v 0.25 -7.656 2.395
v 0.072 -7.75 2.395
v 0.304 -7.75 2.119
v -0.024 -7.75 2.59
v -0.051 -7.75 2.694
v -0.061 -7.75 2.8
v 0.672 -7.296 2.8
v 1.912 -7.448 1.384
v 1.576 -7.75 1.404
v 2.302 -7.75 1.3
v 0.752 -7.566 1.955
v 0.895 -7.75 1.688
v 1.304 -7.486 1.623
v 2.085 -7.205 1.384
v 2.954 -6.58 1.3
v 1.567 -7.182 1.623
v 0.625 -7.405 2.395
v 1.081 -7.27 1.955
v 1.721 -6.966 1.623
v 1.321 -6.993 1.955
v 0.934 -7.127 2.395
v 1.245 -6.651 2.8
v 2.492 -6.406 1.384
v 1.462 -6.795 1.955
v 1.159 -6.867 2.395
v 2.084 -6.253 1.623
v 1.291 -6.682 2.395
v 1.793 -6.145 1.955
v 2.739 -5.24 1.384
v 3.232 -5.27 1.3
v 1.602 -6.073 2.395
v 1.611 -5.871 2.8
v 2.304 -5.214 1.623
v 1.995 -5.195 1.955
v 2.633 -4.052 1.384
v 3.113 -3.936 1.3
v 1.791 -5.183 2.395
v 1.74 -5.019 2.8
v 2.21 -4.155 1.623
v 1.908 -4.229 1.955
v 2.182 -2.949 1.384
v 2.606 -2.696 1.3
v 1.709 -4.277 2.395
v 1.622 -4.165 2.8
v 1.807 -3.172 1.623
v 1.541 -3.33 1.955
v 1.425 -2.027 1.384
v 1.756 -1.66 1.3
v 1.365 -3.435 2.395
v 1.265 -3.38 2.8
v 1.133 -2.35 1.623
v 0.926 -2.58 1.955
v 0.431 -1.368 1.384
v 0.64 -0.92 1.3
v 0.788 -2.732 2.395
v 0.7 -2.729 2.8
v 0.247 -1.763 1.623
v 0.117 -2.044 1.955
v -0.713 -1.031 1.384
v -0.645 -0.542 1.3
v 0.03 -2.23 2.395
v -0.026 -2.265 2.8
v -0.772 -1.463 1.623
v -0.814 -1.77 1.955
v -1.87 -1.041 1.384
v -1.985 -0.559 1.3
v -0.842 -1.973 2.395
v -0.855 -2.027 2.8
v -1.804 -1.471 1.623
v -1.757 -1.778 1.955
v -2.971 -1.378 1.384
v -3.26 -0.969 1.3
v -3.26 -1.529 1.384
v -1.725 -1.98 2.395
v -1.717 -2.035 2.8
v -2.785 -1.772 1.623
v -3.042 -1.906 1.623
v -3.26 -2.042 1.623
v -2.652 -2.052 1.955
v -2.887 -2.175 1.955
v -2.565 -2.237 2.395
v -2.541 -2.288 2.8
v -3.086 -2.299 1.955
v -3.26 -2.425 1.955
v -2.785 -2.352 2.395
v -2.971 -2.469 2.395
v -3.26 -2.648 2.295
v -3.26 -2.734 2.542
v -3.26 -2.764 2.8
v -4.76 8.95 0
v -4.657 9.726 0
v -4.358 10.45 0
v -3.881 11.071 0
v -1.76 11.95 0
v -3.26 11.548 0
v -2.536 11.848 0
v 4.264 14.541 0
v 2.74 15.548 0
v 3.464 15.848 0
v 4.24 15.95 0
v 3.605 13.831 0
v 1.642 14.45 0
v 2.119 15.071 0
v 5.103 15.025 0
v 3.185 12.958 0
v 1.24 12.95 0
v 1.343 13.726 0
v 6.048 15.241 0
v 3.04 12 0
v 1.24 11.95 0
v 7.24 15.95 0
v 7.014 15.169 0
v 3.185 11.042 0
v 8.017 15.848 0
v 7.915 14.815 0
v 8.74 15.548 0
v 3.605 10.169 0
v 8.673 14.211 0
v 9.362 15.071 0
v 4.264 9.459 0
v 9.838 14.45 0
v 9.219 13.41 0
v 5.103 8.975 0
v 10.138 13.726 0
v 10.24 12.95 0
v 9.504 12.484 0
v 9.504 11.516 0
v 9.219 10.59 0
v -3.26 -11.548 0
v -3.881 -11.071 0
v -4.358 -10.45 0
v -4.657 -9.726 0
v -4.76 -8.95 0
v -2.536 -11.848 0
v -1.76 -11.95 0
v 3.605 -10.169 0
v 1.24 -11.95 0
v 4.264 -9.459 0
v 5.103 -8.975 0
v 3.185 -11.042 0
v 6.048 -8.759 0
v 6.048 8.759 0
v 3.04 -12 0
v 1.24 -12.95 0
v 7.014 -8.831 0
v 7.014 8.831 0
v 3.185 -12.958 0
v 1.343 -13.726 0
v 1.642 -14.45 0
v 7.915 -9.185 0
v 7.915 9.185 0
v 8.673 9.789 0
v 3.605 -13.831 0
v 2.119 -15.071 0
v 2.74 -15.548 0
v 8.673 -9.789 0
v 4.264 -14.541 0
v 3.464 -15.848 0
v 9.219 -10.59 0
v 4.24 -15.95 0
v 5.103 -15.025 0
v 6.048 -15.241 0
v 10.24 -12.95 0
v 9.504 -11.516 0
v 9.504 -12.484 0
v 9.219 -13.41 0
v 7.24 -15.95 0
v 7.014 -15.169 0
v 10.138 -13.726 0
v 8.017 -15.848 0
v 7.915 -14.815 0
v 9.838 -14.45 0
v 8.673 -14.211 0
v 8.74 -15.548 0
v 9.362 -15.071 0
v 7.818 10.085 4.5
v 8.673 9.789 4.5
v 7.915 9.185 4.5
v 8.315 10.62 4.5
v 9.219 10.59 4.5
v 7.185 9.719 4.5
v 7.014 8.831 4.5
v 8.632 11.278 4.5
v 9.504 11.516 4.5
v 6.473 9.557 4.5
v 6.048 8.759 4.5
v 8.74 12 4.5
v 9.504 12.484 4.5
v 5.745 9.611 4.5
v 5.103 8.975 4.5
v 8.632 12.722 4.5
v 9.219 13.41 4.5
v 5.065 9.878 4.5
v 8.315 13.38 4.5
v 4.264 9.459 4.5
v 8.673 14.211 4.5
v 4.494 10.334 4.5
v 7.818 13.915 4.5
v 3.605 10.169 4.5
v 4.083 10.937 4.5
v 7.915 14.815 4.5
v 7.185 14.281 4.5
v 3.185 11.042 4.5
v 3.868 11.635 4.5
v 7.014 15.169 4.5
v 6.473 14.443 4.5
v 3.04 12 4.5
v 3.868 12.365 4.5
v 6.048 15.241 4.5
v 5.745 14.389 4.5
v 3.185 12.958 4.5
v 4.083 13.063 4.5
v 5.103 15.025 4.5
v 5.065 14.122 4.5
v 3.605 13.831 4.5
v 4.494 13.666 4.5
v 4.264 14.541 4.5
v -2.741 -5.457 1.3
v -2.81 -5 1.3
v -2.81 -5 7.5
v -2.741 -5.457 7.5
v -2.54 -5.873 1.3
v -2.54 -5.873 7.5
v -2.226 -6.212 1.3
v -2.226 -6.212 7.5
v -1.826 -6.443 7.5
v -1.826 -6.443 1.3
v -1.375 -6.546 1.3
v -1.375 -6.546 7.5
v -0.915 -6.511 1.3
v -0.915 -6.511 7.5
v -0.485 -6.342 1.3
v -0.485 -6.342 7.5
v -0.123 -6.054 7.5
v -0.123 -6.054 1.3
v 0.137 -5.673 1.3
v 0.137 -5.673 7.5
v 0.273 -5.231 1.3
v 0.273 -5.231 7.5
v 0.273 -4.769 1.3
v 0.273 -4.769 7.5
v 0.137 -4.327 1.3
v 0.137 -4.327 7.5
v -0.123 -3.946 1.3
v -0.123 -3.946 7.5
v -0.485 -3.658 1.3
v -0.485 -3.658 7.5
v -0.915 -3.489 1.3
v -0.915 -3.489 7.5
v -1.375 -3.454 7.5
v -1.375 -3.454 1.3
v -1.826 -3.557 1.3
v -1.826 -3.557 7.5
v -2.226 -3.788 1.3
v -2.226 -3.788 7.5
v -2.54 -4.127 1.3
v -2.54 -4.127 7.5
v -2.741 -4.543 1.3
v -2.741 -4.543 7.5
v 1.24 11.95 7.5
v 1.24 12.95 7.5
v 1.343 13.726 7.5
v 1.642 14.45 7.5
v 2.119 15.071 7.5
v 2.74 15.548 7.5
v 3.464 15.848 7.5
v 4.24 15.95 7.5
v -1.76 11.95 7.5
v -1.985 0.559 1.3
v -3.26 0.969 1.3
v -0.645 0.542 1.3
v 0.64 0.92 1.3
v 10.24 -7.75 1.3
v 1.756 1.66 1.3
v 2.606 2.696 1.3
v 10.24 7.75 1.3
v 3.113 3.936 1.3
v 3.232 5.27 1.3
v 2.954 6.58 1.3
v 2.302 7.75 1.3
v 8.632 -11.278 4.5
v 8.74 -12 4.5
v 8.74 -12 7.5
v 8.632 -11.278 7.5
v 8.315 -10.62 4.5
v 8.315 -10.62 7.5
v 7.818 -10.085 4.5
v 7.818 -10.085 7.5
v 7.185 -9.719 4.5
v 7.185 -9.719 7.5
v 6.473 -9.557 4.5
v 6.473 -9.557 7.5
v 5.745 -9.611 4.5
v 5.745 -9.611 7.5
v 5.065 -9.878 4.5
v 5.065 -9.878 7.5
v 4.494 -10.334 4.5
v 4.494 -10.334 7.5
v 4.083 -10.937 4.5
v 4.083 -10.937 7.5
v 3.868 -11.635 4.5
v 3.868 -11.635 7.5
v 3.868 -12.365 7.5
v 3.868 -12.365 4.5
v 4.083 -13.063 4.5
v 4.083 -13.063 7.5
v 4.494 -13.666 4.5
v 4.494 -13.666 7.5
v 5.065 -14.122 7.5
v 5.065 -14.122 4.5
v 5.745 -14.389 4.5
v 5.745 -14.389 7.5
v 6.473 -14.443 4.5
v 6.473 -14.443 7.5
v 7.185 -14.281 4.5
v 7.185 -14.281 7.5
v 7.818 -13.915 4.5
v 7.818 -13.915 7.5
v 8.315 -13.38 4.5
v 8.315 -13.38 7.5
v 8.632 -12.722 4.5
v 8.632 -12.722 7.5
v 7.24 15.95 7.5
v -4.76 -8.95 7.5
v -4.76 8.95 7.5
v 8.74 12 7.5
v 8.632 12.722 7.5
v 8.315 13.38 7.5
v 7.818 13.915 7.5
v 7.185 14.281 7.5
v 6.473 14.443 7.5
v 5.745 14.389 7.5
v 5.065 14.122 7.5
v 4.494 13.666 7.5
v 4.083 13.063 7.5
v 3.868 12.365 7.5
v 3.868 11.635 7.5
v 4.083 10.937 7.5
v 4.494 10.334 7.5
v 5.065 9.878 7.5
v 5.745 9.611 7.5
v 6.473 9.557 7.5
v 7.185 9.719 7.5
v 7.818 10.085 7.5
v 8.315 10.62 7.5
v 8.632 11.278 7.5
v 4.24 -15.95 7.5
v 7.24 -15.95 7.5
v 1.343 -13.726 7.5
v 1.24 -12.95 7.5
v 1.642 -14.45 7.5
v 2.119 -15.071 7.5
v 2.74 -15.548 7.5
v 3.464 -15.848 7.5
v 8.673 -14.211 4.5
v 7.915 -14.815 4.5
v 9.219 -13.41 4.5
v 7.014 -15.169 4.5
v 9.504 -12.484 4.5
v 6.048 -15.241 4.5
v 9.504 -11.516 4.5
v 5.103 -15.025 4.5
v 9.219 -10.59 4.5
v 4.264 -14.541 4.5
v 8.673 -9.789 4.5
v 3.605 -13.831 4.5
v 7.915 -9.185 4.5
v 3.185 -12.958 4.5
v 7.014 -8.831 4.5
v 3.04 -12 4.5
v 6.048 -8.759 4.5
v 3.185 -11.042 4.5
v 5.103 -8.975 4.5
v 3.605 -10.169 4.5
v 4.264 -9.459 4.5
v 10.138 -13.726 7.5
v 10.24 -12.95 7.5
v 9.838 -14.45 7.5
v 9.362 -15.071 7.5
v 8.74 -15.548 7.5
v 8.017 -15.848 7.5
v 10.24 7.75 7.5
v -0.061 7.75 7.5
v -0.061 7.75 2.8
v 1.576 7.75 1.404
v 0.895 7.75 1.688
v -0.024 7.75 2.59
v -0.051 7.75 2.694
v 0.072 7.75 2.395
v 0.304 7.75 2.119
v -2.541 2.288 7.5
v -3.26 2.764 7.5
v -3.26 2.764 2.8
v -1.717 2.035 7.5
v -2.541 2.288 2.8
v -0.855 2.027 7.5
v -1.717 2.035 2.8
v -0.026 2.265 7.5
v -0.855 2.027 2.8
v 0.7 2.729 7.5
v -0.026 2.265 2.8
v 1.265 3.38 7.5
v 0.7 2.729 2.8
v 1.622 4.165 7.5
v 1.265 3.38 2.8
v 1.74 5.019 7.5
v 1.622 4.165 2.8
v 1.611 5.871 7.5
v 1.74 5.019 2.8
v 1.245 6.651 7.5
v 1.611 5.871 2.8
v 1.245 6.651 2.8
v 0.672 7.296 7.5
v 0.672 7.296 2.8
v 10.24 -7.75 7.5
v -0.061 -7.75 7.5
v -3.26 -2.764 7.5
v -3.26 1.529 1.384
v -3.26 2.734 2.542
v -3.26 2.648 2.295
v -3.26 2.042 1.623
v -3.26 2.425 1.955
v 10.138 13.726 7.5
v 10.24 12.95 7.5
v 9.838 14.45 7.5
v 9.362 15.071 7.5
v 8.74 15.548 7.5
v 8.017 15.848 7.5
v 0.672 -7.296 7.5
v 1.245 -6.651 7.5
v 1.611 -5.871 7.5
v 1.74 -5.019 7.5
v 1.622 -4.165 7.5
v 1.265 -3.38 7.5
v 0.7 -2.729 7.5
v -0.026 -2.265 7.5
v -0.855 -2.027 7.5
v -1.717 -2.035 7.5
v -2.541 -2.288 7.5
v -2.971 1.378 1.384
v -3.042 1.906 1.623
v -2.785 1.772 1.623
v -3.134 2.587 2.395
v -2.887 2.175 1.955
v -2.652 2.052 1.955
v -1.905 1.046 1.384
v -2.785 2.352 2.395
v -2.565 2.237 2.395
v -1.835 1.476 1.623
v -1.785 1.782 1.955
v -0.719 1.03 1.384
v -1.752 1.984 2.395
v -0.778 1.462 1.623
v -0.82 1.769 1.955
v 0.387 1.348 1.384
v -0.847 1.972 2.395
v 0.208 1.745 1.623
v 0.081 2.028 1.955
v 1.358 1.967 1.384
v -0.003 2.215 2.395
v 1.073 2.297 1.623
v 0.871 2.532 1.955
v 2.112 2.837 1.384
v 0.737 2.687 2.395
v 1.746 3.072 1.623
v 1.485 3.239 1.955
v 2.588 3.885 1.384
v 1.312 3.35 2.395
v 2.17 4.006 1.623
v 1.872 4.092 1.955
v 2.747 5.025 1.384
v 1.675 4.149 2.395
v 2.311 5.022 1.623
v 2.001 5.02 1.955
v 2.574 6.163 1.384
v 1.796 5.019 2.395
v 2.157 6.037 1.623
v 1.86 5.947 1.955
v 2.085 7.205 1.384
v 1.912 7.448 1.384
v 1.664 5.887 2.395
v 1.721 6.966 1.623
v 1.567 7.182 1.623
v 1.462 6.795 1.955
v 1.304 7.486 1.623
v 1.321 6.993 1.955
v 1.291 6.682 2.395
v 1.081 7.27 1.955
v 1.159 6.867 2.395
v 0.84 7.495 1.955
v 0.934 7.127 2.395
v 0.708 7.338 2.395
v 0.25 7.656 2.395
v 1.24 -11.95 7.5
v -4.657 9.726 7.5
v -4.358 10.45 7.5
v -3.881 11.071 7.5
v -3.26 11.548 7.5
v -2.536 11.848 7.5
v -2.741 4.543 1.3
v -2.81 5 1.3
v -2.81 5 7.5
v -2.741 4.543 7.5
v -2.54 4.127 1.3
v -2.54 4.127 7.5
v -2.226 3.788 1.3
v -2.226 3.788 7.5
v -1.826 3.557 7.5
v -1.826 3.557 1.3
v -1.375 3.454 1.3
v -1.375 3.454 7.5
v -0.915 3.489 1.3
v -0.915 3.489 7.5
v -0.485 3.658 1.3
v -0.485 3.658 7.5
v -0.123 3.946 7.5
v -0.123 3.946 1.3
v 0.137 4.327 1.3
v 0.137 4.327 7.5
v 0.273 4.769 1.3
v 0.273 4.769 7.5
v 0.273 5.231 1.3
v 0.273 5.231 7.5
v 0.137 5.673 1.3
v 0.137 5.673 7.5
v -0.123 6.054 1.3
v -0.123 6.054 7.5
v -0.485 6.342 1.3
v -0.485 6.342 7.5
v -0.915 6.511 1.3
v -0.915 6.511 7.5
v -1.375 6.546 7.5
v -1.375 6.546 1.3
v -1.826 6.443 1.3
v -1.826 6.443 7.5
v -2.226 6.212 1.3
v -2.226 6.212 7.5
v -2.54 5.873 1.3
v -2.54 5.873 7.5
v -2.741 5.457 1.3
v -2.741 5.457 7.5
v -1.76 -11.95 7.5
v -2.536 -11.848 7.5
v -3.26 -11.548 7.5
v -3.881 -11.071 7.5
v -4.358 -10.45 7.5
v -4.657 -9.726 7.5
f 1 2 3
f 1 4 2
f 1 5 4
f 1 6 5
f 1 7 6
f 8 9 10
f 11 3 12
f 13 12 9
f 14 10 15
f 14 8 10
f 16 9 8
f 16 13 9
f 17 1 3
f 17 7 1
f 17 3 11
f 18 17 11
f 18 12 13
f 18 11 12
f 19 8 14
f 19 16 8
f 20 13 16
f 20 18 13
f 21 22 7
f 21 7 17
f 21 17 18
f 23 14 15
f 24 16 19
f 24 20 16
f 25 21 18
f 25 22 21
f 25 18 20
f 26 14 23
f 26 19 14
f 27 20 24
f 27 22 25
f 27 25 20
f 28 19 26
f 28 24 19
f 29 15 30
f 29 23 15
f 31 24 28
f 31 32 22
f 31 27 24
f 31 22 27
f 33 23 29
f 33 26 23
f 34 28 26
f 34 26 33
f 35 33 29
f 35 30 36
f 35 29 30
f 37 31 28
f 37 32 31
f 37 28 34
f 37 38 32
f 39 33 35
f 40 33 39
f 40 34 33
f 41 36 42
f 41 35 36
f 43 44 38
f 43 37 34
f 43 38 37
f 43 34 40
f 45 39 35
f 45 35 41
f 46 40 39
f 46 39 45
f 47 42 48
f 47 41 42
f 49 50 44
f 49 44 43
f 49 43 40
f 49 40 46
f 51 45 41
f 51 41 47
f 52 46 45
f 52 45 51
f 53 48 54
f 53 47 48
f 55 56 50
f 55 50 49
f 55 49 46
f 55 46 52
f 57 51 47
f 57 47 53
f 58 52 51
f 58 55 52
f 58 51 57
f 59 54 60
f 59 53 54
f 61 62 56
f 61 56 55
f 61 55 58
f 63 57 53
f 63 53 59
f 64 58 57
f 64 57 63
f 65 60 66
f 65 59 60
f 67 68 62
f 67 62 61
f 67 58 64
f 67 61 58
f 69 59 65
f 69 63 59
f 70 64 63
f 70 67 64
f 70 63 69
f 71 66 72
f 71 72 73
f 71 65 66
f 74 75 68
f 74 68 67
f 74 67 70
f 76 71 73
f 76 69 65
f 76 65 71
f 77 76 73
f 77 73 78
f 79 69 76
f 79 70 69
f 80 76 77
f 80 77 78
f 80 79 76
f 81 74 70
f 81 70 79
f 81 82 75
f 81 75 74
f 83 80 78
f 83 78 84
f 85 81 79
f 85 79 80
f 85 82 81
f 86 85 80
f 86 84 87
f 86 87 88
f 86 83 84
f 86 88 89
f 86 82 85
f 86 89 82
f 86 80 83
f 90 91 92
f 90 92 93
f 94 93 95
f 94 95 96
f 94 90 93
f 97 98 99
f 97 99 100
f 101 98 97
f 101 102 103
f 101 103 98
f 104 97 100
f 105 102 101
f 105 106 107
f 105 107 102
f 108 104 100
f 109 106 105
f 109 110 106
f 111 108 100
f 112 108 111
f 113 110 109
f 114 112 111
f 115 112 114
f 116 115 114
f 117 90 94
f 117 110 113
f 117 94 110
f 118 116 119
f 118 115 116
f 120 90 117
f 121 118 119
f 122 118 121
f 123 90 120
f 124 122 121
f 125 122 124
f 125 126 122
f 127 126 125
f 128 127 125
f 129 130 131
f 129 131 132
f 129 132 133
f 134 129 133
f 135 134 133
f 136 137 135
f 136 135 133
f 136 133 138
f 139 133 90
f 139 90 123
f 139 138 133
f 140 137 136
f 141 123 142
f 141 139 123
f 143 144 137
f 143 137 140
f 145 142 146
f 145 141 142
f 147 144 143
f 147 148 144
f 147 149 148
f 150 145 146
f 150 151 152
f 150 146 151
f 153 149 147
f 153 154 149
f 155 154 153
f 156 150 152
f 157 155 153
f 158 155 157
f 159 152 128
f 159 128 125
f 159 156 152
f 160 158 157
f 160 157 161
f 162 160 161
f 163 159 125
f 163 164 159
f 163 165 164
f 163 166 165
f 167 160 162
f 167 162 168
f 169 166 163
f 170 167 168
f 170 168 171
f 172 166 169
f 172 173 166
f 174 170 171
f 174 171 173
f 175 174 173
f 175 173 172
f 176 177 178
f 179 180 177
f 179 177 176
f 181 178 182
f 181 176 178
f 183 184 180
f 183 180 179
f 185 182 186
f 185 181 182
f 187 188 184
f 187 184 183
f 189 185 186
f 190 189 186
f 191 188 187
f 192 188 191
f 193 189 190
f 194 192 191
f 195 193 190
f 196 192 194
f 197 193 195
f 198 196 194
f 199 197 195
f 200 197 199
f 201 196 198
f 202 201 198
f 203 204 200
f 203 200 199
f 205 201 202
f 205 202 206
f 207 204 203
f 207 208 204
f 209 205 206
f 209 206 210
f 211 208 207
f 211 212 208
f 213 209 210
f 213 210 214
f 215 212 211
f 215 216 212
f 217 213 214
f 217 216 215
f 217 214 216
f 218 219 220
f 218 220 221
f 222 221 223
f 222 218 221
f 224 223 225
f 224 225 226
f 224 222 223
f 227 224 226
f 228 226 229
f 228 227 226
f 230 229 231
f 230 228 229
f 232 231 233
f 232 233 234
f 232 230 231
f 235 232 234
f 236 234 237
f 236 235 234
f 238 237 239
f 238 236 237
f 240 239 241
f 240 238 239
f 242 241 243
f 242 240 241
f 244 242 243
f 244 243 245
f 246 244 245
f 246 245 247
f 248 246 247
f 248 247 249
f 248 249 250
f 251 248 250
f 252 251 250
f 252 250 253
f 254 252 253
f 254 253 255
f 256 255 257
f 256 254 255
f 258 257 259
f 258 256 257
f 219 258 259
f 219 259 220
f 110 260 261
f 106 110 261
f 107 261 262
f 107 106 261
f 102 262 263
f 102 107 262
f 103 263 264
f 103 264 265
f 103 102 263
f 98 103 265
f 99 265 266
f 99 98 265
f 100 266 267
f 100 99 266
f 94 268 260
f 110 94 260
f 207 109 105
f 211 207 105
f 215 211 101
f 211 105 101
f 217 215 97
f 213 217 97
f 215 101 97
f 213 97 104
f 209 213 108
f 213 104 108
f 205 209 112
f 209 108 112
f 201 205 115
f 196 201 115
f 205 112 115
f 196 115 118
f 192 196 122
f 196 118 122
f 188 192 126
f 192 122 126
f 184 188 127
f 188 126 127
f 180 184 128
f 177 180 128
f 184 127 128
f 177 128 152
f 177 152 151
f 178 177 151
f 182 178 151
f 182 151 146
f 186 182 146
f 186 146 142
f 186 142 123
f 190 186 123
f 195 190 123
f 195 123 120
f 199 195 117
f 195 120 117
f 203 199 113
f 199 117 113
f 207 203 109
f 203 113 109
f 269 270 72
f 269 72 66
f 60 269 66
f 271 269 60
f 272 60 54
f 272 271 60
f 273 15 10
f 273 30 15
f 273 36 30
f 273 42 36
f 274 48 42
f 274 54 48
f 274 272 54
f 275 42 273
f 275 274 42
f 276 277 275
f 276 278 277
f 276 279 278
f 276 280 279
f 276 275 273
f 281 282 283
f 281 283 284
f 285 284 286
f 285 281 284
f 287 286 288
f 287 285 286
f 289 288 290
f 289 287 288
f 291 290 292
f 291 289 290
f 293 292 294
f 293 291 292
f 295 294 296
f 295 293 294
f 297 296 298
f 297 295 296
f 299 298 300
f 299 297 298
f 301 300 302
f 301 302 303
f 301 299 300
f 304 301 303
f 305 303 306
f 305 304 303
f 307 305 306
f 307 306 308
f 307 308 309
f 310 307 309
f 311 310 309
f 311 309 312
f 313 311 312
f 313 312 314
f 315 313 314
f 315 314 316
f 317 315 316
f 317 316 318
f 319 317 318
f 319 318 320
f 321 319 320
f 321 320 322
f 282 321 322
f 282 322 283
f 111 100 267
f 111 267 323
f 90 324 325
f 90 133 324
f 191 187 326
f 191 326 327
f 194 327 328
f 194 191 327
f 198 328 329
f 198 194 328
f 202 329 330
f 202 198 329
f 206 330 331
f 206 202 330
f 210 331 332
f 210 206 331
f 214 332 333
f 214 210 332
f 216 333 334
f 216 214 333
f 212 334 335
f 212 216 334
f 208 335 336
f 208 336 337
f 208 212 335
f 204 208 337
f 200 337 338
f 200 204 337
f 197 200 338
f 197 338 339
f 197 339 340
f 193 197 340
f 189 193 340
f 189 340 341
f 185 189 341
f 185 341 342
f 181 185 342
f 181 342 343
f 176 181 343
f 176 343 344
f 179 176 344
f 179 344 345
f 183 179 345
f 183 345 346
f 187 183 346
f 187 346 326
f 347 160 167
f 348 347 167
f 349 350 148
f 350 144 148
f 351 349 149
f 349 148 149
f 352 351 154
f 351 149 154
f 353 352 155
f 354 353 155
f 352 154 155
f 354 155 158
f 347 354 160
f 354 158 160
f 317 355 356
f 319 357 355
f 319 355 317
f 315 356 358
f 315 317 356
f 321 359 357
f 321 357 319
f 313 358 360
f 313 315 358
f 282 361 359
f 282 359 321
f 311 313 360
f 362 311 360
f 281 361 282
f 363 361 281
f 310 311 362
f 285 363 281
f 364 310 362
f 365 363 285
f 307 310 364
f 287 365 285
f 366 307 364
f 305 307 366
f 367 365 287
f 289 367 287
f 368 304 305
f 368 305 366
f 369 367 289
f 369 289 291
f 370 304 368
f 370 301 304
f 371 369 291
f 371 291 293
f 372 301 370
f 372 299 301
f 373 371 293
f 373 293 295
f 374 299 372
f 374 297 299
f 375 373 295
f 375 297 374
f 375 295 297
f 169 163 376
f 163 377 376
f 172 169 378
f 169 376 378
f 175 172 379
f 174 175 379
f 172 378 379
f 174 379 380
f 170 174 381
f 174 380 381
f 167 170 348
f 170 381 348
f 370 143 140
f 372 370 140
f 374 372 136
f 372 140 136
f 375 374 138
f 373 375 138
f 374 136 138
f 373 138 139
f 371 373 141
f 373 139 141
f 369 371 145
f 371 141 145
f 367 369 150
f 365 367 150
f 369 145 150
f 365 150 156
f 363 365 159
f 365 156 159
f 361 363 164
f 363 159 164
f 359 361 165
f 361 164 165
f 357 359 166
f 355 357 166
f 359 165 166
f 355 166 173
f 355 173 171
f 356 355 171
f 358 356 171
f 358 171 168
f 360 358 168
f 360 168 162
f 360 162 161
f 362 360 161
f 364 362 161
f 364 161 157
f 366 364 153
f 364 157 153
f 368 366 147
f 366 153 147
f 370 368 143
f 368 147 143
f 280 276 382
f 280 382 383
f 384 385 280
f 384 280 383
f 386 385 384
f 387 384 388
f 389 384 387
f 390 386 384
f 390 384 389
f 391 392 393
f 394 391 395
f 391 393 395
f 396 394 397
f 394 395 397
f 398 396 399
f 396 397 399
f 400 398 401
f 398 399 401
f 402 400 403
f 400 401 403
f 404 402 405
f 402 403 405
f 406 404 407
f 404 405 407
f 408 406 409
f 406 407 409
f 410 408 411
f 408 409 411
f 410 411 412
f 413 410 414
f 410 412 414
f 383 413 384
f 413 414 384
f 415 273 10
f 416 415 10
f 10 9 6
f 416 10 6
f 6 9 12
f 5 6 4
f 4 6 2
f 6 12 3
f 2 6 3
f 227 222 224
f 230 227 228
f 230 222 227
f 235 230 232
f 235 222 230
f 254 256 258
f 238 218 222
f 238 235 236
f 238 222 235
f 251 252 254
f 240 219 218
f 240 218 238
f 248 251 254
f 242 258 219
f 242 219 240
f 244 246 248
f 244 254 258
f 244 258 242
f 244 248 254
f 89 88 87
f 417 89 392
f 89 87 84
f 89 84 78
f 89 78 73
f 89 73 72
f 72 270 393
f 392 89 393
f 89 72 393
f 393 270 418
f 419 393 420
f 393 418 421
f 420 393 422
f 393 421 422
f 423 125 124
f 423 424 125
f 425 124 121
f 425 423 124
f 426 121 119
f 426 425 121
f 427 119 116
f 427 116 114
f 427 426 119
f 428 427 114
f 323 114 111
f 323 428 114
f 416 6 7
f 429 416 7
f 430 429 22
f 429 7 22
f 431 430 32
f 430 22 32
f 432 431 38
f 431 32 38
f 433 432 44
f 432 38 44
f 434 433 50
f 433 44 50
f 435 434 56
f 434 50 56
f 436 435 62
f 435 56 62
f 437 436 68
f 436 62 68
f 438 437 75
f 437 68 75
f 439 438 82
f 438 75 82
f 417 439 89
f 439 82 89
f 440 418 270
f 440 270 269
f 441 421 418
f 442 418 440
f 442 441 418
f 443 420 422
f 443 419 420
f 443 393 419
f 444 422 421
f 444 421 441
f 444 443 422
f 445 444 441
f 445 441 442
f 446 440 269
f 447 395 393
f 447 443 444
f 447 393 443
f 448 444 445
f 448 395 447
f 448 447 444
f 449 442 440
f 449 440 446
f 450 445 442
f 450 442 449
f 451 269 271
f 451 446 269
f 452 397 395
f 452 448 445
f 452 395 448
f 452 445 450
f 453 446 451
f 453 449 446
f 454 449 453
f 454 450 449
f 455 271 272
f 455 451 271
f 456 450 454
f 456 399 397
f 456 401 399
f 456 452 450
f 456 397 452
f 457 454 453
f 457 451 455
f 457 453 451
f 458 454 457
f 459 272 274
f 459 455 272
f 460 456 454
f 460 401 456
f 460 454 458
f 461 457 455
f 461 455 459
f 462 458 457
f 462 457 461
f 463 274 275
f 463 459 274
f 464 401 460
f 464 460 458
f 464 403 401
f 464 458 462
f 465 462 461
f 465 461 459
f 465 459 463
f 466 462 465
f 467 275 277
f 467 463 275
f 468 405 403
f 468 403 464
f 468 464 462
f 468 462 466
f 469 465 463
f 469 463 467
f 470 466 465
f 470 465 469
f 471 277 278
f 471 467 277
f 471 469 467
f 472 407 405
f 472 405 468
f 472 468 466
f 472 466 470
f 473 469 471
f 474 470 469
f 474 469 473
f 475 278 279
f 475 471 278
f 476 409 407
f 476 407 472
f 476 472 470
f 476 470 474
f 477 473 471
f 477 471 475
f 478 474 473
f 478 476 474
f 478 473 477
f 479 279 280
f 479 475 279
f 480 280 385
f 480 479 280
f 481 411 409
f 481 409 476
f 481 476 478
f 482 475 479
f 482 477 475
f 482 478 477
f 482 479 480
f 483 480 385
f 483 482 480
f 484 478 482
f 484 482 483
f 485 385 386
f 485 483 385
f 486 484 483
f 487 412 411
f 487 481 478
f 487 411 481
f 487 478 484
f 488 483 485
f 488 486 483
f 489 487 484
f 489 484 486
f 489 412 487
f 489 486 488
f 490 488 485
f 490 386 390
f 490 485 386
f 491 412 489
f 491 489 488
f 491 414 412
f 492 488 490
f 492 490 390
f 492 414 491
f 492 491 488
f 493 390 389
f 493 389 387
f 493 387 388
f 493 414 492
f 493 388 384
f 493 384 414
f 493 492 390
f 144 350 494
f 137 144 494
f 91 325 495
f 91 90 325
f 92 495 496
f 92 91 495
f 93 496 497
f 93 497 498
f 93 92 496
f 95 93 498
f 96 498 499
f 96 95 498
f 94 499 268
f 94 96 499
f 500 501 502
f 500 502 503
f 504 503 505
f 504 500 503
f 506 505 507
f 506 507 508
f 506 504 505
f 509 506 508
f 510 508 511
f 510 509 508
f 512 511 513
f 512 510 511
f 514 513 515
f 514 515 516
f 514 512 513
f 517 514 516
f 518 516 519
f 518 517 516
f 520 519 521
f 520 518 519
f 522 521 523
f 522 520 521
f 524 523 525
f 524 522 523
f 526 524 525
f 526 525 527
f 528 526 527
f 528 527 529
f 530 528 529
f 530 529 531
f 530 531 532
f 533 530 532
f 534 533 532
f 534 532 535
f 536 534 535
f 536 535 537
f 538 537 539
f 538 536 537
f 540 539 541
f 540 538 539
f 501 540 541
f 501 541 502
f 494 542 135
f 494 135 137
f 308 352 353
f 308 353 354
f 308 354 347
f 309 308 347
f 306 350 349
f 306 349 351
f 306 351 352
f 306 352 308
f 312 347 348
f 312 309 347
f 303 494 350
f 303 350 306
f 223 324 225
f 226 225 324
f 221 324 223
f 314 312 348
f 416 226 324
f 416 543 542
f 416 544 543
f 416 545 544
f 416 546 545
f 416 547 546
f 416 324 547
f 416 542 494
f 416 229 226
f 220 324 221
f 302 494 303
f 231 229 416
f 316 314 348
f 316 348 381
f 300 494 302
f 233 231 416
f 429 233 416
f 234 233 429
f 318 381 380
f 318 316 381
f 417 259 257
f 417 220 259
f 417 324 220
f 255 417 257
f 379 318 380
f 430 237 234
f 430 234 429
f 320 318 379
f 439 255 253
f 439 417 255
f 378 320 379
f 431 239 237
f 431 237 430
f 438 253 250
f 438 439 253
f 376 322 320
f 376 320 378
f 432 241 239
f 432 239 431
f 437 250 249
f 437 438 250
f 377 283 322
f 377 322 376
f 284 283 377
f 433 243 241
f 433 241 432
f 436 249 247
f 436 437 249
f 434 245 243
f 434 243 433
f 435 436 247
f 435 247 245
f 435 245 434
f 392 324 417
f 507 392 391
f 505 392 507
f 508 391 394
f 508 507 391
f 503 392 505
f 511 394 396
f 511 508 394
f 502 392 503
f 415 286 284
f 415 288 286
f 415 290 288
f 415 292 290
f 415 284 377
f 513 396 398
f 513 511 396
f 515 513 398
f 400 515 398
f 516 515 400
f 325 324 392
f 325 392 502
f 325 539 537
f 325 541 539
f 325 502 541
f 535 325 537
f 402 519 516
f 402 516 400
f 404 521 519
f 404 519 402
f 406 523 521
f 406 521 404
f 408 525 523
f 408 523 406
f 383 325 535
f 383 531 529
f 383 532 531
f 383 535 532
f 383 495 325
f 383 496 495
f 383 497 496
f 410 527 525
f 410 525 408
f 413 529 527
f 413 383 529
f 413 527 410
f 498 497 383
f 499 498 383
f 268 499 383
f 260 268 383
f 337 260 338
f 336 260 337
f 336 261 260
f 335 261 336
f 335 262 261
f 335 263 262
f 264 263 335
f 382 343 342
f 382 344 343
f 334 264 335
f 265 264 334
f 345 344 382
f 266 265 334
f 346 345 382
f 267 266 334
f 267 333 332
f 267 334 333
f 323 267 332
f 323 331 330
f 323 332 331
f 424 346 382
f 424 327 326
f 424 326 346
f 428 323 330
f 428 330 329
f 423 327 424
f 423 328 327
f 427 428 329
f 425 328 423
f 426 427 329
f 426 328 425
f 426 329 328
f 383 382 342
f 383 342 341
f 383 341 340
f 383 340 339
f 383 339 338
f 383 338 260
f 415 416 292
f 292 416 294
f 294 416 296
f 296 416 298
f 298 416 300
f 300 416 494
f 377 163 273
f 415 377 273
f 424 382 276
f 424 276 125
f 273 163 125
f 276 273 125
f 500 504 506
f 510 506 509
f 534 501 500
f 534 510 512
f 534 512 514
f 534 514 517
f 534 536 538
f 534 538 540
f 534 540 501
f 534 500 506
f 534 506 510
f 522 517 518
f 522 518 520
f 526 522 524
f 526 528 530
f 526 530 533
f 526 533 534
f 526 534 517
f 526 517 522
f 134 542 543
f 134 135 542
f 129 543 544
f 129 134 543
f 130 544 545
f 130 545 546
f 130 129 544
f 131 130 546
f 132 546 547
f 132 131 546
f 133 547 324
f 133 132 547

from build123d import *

# Parameters (mm, degrees)
SKETCH1_W                       = 20.480821918
SKETCH1_H                       = 31.9
SKETCH1_R                       = 2.45
BOSS_EXTRUDE1_DEPTH             = 7.5
SKETCH2_W                       = 18.980821918
SKETCH2_H                       = 9.35
CUT_EXTRUDE1_DEPTH              = 6.2
CUT_EXTRUDE2_REACH              = 22.384
SKETCH5_W                       = 5.480821918
SKETCH5_H                       = 31.9
SKETCH3_R                       = 3
SKETCH3_R_2                     = 1.55
BOSS_EXTRUDE4_DEPTH             = 6.2
SKETCH6_W                       = 1.5
SKETCH6_H                       = 15.5
CUT_EXTRUDE3_DEPTH              = 6.2
SKETCH7_W                       = 1.5
SKETCH7_H                       = 18.7
BOSS_EXTRUDE5_DEPTH             = 6.2
FILLET1_R                       = 3
SKETCH8_W                       = 6
SKETCH8_H                       = 4
CUT_EXTRUDE4_DEPTH              = 7.5
FILLET2_R                       = 3
BOSS_EXTRUDE6_REACH             = 21.943
BOSS_EXTRUDE6_DIRECTION_2_REACH = 21.943
SKETCH10_R                      = 3.25
CUT_EXTRUDE6_DEPTH              = 4.5
FILLET3_R                       = 1.5


with BuildPart() as part:
    # Sketch1 → Boss-Extrude1 (new body)
    with BuildSketch(Plane.XY):
        Rectangle(SKETCH1_W, SKETCH1_H)
        with Locations((6.290410959, 12)):
            Circle(SKETCH1_R, mode=Mode.SUBTRACT)
        with Locations((6.290410959, -12)):
            Circle(SKETCH1_R, mode=Mode.SUBTRACT)
    extrude(amount=BOSS_EXTRUDE1_DEPTH)

    # Sketch2 → Cut-Extrude1 (cut)
    with BuildSketch(Plane.XY.offset(7.5)):
        with Locations((-0.75, 4.675)):
            Rectangle(SKETCH2_W, SKETCH2_H)
        with Locations((-0.75, -4.675)):
            Rectangle(SKETCH2_W, SKETCH2_H)
    extrude(amount=-CUT_EXTRUDE1_DEPTH, mode=Mode.SUBTRACT)

    # Cut-Extrude2: up to this face of the body (flat: up to its plane)
    cut_extrude2_end = Plane(part.part.faces().sort_by_distance((-0.385368256, 0, 0))[0])
    # Sketch5 → Cut-Extrude2 (cut, up to the picked face)
    with BuildSketch(Plane.XY.offset(7.5), mode=Mode.PRIVATE) as cut_extrude2_sk1:
        with Locations((-7.5, 0)):
            Rectangle(SKETCH5_W, SKETCH5_H)
    cut_extrude2_tool1 = split(extrude(cut_extrude2_sk1.sketch, amount=-CUT_EXTRUDE2_REACH, mode=Mode.PRIVATE), bisect_by=cut_extrude2_end, keep=Keep.BOTH, mode=Mode.PRIVATE)
    add(cut_extrude2_tool1.solids().sort_by(Axis((-7.5, 0, 7.5), (0, 0, -1)))[0], mode=Mode.SUBTRACT)

    # Sketch3 → Boss-Extrude4 (add)
    # profile 1 of 2: a face of its own
    with BuildSketch(Plane.XY.offset(1.3)):
        with Locations(Location((-1.259589041, 5, 0), (0, 0, 180))):
            Circle(SKETCH3_R)
        with Locations(Location((-1.259589041, 5, 0), (0, 0, 180))):
            Circle(SKETCH3_R_2, mode=Mode.SUBTRACT)
    # profile 2 of 2: a face of its own
    with BuildSketch(Plane.XY.offset(1.3)):
        with Locations(Location((-1.259589041, -5, 0), (0, 0, 180))):
            Circle(SKETCH3_R)
        with Locations(Location((-1.259589041, -5, 0), (0, 0, 180))):
            Circle(SKETCH3_R_2, mode=Mode.SUBTRACT)
    extrude(amount=BOSS_EXTRUDE4_DEPTH)

    # Sketch6 → Cut-Extrude3 (cut)
    with BuildSketch(Plane.XY.offset(7.5)):
        with Locations((9.490410959, 0)):
            Rectangle(SKETCH6_W, SKETCH6_H)
    extrude(amount=-CUT_EXTRUDE3_DEPTH, mode=Mode.SUBTRACT)

    # Sketch7 → Boss-Extrude5 (add)
    with BuildSketch(Plane.XY.offset(1.3)):
        with Locations((-4.009589041, 0)):
            Rectangle(SKETCH7_W, SKETCH7_H)
    extrude(amount=BOSS_EXTRUDE5_DEPTH)

    # Fillet1
    fillet1_edges = [part.edges().sort_by_distance(p)[0] for p in [
        (10.240410959, 15.95, 3.75),
        (10.240410959, -15.95, 3.75),
    ]]
    fillet(fillet1_edges, radius=FILLET1_R)

    # Sketch8 → Cut-Extrude4 (cut)
    with BuildSketch(Plane.XY.offset(7.5)):
        with Locations((-1.759589041, 13.95)):
            Rectangle(SKETCH8_W, SKETCH8_H)
        with Locations((-1.759589041, -13.95)):
            Rectangle(SKETCH8_W, SKETCH8_H)
    extrude(amount=-CUT_EXTRUDE4_DEPTH, mode=Mode.SUBTRACT)

    # Fillet2
    fillet2_edges = [part.edges().sort_by_distance(p)[0] for p in [
        (1.240410959, 15.95, 3.75),
        (-4.759589041, 11.95, 3.75),
        (1.240410959, -15.95, 3.75),
        (-4.759589041, -11.95, 3.75),
    ]]
    fillet(fillet2_edges, radius=FILLET2_R)

    # Boss-Extrude6: up to this face of the body (flat: up to its plane)
    boss_extrude6_end = Plane(part.part.faces().sort_by_distance((5.740410959, -15.597493262, 7.5))[0])
    # Sketch11 → Boss-Extrude6 (add, up to the picked face)
    with BuildSketch(Plane.XY.offset(1.3), mode=Mode.PRIVATE) as boss_extrude6_sk1:
        with BuildLine():
            Line((-3.259589041, 7.236067977), (-3.259589041, 7.75))
            Line((-3.259589041, 7.75), (-3.259589041, 9.35))
            Line((-3.259589041, 9.35), (8.740410959, 9.35))
            Line((8.740410959, 9.35), (8.740410959, 7.75))
            Line((8.740410959, 7.75), (-0.06063116, 7.75))
            ThreePointArc((-0.06063116, 7.75), (-1.735455251, 7.962018121), (-3.259589041, 7.236067977))
        make_face()
    boss_extrude6_tool1 = split(extrude(boss_extrude6_sk1.sketch, amount=BOSS_EXTRUDE6_REACH, mode=Mode.PRIVATE), bisect_by=boss_extrude6_end, keep=Keep.BOTH, mode=Mode.PRIVATE)
    # Sketch11 → Boss-Extrude6 (add, up to the picked face)
    with BuildSketch(Plane.XY.offset(1.3), mode=Mode.PRIVATE) as boss_extrude6_sk2:
        with BuildLine():
            Line((-3.259589041, -7.75), (-3.259589041, -9.35))
            Line((-3.259589041, -9.35), (8.740410959, -9.35))
            Line((8.740410959, -9.35), (8.740410959, -7.75))
            Line((8.740410959, -7.75), (-0.06063116, -7.75))
            ThreePointArc((-0.06063116, -7.75), (-1.735455251, -7.962018121), (-3.259589041, -7.236067977))
            Line((-3.259589041, -7.236067977), (-3.259589041, -7.75))
        make_face()
    boss_extrude6_tool2 = split(extrude(boss_extrude6_sk2.sketch, amount=BOSS_EXTRUDE6_REACH, mode=Mode.PRIVATE), bisect_by=boss_extrude6_end, keep=Keep.BOTH, mode=Mode.PRIVATE)
    add(boss_extrude6_tool1.solids().sort_by(Axis((2.770321, 8.555653, 1.3), (0, 0, 1)))[0])
    add(boss_extrude6_tool2.solids().sort_by(Axis((2.770321, -8.555653, 1.3), (0, 0, 1)))[0])

    # Boss-Extrude6 direction 2: up to this face of the body (flat: up to its plane)
    boss_extrude6_direction_2_end = Plane(part.part.faces().sort_by_distance((2.964227546, 0, 0))[0])
    # Sketch11 → Boss-Extrude6 direction 2 (add, up to the picked face)
    with BuildSketch(Plane.XY.offset(1.3), mode=Mode.PRIVATE) as boss_extrude6_direction_2_sk1:
        with BuildLine():
            Line((-3.259589041, 7.236067977), (-3.259589041, 7.75))
            Line((-3.259589041, 7.75), (-3.259589041, 9.35))
            Line((-3.259589041, 9.35), (8.740410959, 9.35))
            Line((8.740410959, 9.35), (8.740410959, 7.75))
            Line((8.740410959, 7.75), (-0.06063116, 7.75))
            ThreePointArc((-0.06063116, 7.75), (-1.735455251, 7.962018121), (-3.259589041, 7.236067977))
        make_face()
    boss_extrude6_direction_2_tool1 = split(extrude(boss_extrude6_direction_2_sk1.sketch, amount=-BOSS_EXTRUDE6_DIRECTION_2_REACH, mode=Mode.PRIVATE), bisect_by=boss_extrude6_direction_2_end, keep=Keep.BOTH, mode=Mode.PRIVATE)
    # Sketch11 → Boss-Extrude6 direction 2 (add, up to the picked face)
    with BuildSketch(Plane.XY.offset(1.3), mode=Mode.PRIVATE) as boss_extrude6_direction_2_sk2:
        with BuildLine():
            Line((-3.259589041, -7.75), (-3.259589041, -9.35))
            Line((-3.259589041, -9.35), (8.740410959, -9.35))
            Line((8.740410959, -9.35), (8.740410959, -7.75))
            Line((8.740410959, -7.75), (-0.06063116, -7.75))
            ThreePointArc((-0.06063116, -7.75), (-1.735455251, -7.962018121), (-3.259589041, -7.236067977))
            Line((-3.259589041, -7.236067977), (-3.259589041, -7.75))
        make_face()
    boss_extrude6_direction_2_tool2 = split(extrude(boss_extrude6_direction_2_sk2.sketch, amount=-BOSS_EXTRUDE6_DIRECTION_2_REACH, mode=Mode.PRIVATE), bisect_by=boss_extrude6_direction_2_end, keep=Keep.BOTH, mode=Mode.PRIVATE)
    add(boss_extrude6_direction_2_tool1.solids().sort_by(Axis((2.770321, 8.555653, 1.3), (0, 0, -1)))[0])
    add(boss_extrude6_direction_2_tool2.solids().sort_by(Axis((2.770321, -8.555653, 1.3), (0, 0, -1)))[0])

    # Sketch10 → Cut-Extrude6 (cut)
    with BuildSketch(Plane(origin=(0, 0, 0), x_dir=(-1, 0, 0), z_dir=(0, 0, -1))):
        with Locations((-6.290410959, 12)):
            Circle(SKETCH10_R)
        with Locations((-6.290410959, -12)):
            Circle(SKETCH10_R)
    extrude(amount=-CUT_EXTRUDE6_DEPTH, mode=Mode.SUBTRACT)

    # Fillet3
    fillet3_edges = [part.edges().sort_by_distance(p)[0] for p in [
        (1.265413056, 3.380010984, 1.3),
        (1.265413056, -3.380010984, 1.3),
    ]]
    fillet(fillet3_edges, radius=FILLET3_R)


solid = part.part
